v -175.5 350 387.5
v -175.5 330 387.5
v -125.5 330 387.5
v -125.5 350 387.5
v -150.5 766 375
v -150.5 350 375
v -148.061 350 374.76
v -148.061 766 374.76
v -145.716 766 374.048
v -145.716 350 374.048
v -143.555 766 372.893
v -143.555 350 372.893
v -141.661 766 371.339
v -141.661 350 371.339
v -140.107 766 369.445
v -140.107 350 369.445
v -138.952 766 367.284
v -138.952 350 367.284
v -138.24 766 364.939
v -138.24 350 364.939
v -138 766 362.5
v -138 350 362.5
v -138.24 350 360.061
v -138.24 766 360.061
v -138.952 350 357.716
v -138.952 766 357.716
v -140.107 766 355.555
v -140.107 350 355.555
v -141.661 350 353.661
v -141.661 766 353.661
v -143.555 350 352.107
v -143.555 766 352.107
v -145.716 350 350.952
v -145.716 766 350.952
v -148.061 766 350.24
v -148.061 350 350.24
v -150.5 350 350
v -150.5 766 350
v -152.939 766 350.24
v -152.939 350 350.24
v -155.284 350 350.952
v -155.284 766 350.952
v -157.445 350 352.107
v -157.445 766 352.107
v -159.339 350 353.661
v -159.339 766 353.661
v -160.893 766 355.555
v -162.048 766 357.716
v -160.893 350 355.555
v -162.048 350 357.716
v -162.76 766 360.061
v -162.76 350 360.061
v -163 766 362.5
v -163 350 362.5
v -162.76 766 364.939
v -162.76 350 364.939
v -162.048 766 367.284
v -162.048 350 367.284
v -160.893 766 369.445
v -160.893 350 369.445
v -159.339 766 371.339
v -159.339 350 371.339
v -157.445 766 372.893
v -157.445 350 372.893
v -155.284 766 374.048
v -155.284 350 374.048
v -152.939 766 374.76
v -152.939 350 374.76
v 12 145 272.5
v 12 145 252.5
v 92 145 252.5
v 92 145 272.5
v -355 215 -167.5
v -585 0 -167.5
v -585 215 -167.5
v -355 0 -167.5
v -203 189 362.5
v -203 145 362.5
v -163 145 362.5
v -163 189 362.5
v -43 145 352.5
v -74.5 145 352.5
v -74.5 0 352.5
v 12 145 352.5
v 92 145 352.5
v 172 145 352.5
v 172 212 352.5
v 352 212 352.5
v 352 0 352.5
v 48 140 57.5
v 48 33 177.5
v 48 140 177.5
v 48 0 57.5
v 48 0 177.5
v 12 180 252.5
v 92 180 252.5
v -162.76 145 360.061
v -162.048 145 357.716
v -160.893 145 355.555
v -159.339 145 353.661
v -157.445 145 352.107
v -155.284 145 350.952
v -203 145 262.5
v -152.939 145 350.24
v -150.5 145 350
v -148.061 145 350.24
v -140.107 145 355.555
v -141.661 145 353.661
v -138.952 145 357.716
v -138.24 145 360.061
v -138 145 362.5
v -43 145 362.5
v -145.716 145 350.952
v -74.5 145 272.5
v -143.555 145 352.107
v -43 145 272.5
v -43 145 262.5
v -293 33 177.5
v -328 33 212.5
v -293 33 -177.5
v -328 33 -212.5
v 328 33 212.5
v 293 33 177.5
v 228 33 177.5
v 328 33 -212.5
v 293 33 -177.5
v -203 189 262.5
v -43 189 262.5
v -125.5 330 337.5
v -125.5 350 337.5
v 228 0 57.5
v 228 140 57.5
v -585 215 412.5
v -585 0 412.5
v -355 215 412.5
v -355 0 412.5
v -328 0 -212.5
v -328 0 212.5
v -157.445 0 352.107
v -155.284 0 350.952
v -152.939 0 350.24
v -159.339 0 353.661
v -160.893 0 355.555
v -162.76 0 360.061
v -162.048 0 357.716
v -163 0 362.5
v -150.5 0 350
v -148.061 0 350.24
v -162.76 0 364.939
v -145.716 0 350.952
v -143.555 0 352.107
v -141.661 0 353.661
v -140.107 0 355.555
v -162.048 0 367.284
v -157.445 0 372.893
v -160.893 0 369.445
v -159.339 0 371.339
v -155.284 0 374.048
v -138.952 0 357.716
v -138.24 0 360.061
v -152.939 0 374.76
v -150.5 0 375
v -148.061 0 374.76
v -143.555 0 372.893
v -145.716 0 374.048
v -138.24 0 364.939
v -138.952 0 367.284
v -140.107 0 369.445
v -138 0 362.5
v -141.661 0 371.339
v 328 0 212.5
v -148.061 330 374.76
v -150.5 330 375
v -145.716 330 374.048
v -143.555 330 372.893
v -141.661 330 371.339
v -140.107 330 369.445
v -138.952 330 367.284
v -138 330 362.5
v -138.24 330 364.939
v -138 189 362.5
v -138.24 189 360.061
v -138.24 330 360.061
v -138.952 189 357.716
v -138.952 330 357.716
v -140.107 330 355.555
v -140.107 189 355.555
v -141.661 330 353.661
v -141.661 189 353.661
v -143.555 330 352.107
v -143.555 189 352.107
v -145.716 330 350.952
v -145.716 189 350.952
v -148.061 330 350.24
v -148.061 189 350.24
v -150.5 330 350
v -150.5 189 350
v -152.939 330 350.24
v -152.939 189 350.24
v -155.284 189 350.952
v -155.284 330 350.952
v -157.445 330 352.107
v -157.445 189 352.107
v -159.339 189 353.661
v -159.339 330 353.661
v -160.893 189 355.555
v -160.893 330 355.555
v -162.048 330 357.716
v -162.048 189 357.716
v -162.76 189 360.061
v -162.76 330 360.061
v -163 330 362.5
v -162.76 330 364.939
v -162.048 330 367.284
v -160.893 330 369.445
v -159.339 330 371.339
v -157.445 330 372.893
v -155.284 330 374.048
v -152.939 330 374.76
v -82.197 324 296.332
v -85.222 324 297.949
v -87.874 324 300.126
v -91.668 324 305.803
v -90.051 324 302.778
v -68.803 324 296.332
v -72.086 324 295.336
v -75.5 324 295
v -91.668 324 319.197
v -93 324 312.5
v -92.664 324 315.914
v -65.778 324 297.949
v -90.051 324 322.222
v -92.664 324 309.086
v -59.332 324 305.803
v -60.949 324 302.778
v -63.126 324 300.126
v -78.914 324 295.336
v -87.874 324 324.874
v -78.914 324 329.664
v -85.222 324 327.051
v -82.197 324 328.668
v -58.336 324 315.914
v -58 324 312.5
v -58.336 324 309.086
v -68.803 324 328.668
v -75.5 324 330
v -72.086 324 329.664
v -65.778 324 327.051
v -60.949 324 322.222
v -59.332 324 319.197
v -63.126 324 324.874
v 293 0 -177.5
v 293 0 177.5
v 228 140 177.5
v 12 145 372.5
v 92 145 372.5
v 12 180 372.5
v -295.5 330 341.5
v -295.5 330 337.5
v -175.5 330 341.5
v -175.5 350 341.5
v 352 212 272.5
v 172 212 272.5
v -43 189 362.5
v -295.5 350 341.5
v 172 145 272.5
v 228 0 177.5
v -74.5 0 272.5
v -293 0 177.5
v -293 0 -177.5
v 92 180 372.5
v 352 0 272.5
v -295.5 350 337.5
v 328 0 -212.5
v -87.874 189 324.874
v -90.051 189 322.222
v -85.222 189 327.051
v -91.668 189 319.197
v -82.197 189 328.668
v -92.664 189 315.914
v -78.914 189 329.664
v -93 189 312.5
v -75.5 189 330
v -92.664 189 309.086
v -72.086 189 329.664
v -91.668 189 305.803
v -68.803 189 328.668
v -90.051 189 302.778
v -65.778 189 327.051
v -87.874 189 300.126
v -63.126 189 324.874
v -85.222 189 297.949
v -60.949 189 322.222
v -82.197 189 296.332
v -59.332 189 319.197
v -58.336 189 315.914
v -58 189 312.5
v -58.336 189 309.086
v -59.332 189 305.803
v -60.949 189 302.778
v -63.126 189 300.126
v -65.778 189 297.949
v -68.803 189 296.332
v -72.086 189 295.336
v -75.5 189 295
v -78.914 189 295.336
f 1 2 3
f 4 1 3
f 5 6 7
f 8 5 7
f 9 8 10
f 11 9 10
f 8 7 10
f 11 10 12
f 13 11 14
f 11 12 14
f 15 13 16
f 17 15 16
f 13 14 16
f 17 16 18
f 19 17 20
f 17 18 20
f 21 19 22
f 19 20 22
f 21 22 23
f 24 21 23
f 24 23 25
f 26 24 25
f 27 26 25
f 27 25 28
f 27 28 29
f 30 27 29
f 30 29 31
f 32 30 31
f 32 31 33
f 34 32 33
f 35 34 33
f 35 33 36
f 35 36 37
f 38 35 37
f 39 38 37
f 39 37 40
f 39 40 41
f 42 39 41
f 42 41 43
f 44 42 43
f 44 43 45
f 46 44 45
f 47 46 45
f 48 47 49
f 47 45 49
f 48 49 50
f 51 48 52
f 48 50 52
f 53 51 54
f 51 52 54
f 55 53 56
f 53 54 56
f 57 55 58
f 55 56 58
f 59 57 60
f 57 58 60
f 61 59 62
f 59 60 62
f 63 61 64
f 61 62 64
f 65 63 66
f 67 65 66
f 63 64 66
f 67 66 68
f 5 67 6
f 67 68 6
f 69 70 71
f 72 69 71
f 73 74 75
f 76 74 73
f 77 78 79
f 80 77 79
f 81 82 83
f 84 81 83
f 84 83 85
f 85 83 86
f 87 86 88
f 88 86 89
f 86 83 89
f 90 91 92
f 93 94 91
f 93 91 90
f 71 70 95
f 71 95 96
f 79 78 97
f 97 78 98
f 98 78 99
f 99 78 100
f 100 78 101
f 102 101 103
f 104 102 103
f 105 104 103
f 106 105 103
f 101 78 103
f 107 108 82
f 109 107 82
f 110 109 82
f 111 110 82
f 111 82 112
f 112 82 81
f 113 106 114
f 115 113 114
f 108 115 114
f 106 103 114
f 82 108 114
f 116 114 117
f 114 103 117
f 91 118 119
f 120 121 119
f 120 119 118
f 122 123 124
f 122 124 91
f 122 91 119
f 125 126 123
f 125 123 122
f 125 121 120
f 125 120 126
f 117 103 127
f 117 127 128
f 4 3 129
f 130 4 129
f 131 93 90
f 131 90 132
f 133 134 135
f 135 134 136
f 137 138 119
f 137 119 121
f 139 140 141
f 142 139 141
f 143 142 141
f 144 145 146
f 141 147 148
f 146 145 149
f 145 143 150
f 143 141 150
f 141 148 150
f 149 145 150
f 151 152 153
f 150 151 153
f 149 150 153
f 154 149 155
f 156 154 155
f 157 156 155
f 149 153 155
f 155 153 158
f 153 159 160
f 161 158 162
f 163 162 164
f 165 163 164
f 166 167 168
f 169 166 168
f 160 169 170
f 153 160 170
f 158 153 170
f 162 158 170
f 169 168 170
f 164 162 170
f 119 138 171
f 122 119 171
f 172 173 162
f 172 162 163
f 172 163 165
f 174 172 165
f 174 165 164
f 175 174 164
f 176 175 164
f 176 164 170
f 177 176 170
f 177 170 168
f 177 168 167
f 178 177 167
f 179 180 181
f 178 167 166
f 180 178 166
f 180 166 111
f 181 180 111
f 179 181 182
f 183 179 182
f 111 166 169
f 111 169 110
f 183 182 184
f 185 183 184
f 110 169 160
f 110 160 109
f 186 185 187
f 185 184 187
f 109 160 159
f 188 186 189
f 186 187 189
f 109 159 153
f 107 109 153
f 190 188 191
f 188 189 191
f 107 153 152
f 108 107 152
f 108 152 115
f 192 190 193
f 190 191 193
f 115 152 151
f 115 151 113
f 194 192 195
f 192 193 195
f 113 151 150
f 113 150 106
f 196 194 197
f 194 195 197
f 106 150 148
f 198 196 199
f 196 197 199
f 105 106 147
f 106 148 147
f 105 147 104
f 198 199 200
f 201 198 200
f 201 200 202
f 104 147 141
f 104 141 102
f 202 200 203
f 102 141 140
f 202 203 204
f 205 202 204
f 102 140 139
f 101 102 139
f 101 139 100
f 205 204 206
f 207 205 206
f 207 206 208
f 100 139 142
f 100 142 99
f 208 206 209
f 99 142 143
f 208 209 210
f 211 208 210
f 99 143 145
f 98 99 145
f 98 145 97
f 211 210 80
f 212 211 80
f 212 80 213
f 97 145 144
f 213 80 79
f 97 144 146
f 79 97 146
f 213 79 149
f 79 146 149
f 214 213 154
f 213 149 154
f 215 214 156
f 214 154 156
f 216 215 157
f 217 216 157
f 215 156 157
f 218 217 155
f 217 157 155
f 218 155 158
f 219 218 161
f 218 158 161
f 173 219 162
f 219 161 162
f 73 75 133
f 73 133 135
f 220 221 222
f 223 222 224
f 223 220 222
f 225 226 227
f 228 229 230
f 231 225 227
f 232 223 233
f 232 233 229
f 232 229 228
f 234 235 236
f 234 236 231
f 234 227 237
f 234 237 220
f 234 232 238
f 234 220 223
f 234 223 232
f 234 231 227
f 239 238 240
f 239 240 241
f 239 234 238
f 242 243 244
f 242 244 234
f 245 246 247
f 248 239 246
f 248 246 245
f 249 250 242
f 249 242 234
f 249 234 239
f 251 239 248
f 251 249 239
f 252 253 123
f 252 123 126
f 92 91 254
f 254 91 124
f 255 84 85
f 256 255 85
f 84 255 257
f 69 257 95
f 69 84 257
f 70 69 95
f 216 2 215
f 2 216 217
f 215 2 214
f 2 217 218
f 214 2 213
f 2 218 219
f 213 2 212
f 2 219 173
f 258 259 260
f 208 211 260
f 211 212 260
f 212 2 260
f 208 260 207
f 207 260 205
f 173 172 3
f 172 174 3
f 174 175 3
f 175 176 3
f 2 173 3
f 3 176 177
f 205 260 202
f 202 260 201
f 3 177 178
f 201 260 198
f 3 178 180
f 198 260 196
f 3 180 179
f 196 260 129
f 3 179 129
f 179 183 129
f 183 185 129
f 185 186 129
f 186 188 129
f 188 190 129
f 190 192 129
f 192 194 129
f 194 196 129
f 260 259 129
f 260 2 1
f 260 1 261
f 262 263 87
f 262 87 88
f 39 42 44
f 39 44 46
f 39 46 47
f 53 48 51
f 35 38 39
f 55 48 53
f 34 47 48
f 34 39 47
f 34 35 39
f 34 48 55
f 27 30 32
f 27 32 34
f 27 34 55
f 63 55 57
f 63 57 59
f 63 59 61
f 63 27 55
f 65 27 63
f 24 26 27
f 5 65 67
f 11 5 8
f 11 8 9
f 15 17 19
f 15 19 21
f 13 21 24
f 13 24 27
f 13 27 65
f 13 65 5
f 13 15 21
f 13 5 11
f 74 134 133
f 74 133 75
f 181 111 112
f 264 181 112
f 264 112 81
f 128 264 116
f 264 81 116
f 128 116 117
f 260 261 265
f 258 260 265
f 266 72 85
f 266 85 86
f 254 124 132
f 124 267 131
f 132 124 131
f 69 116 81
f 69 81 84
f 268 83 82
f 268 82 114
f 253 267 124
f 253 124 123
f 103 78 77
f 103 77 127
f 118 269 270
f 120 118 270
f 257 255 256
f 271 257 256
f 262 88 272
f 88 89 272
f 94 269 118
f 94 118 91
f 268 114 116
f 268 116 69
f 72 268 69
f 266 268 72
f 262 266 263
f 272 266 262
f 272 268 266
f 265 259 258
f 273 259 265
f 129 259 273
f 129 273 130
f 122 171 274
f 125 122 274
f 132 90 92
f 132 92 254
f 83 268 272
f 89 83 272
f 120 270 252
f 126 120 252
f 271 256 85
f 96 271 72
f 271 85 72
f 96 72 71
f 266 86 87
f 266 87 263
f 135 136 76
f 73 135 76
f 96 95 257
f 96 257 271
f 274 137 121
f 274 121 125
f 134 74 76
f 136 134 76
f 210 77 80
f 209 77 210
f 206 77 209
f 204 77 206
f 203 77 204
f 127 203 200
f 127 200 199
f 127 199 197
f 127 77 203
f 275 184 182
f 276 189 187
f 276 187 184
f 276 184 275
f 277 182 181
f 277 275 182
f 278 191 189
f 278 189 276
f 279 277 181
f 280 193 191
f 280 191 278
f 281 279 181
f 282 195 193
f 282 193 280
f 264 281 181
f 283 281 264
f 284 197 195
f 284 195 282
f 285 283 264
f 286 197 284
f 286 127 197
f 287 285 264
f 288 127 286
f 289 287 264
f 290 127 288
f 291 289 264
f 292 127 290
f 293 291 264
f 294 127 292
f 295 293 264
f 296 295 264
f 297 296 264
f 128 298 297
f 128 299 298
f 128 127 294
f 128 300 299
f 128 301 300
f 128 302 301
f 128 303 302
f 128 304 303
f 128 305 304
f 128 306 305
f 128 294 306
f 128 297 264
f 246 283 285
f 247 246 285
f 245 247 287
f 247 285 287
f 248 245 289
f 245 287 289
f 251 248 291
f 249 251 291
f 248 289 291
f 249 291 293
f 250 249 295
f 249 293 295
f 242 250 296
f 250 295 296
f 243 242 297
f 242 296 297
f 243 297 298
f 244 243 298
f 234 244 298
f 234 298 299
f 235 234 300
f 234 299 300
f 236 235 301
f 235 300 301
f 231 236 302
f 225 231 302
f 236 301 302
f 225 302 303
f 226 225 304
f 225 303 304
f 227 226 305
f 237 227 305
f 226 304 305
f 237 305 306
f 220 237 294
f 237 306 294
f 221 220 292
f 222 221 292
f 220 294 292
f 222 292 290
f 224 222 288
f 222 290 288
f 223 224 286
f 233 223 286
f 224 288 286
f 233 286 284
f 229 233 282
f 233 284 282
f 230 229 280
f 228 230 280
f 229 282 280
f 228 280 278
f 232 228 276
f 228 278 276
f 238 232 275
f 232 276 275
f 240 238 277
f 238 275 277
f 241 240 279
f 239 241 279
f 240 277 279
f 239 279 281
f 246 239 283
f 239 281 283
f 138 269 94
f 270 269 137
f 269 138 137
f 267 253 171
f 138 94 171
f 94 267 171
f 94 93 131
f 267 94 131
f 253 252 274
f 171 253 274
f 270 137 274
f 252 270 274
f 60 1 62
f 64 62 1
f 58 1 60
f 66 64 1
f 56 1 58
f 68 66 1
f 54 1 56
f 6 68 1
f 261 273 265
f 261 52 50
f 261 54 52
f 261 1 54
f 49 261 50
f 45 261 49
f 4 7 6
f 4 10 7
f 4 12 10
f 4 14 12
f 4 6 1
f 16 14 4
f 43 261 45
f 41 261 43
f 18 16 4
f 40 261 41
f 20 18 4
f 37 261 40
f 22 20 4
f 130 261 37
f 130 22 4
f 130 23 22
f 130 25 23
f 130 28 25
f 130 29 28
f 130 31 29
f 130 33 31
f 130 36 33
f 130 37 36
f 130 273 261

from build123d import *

# Parameters (mm, degrees)
SKETCH1_W            = 656
SKETCH1_H            = 425
SKETCH1_W_2          = 586
SKETCH1_H_2          = 355
BOSS_EXTRUDE1_DEPTH  = 33
SKETCH2_W            = 180
SKETCH2_H            = 120
BOSS_EXTRUDE2_DEPTH  = 140
SKETCH4_W            = 426.5
SKETCH4_H            = 80
BOSS_EXTRUDE3_DEPTH  = 145
SKETCH5_W            = 180
SKETCH5_H            = 80
BOSS_EXTRUDE4_DEPTH  = 67
SKETCH6_W            = 80
SKETCH6_H            = 120
BOSS_EXTRUDE5_DEPTH  = 35
SKETCH7_W            = 160
SKETCH7_H            = 100
BOSS_EXTRUDE6_DEPTH  = 44
SKETCH8_R            = 17.5
BOSS_EXTRUDE7_DEPTH  = 135
SKETCH10_W           = 230
SKETCH10_H           = 580
BOSS_EXTRUDE8_DEPTH  = 215
SKETCH9_R            = 12.5
BOSS_EXTRUDE9_DEPTH  = 766
SKETCH11_W           = 50
SKETCH11_H           = 50
SKETCH11_R           = 12.5
BOSS_EXTRUDE10_DEPTH = 20
SKETCH12_W           = 170
SKETCH12_H           = 20
BOSS_EXTRUDE11_DEPTH = 4


with BuildPart() as part:
    # Sketch1 → Boss-Extrude1 (new body)
    with BuildSketch(Plane(origin=(0, 0, 0), x_dir=(1, 0, 0), z_dir=(0, 1, 0))):
        Rectangle(SKETCH1_W, SKETCH1_H)
        Rectangle(SKETCH1_W_2, SKETCH1_H_2, mode=Mode.SUBTRACT)
    extrude(amount=BOSS_EXTRUDE1_DEPTH)

    # Sketch2 → Boss-Extrude2 (add)
    with BuildSketch(Plane(origin=(0, 0, 0), x_dir=(1, 0, 0), z_dir=(0, 1, 0))):
        with Locations((138, -117.5)):
            Rectangle(SKETCH2_W, SKETCH2_H)
    extrude(amount=BOSS_EXTRUDE2_DEPTH)


with BuildPart() as body_2:
    # Sketch4 → Boss-Extrude3 (new body)
    with BuildSketch(Plane(origin=(0, 0, 0), x_dir=(1, 0, 0), z_dir=(0, 1, 0))):
        with Locations((138.75, -312.5)):
            Rectangle(SKETCH4_W, SKETCH4_H)
    extrude(amount=BOSS_EXTRUDE3_DEPTH)

    # Sketch5 → Boss-Extrude4 (add)
    with BuildSketch(Plane(origin=(0, 145, 0), x_dir=(1, 0, 0), z_dir=(0, 1, 0))):
        with Locations((262, -312.5)):
            Rectangle(SKETCH5_W, SKETCH5_H)
    extrude(amount=BOSS_EXTRUDE4_DEPTH)

    # Sketch6 → Boss-Extrude5 (add)
    with BuildSketch(Plane(origin=(0, 145, 0), x_dir=(1, 0, 0), z_dir=(0, 1, 0))):
        with Locations((52, -312.5)):
            Rectangle(SKETCH6_W, SKETCH6_H)
    extrude(amount=BOSS_EXTRUDE5_DEPTH)

    # Sketch7 → Boss-Extrude6 (add)
    with BuildSketch(Plane(origin=(0, 145, 0), x_dir=(1, 0, 0), z_dir=(0, 1, 0))):
        with Locations((-123, -312.5)):
            Rectangle(SKETCH7_W, SKETCH7_H)
    extrude(amount=BOSS_EXTRUDE6_DEPTH)

    # Sketch8 → Boss-Extrude7 (add)
    with BuildSketch(Plane(origin=(0, 189, 0), x_dir=(1, 0, 0), z_dir=(0, 1, 0))):
        with Locations((-75.5, -312.5)):
            Circle(SKETCH8_R)
    extrude(amount=BOSS_EXTRUDE7_DEPTH)

    # Sketch9 → Boss-Extrude9 (add)
    with BuildSketch(Plane(origin=(0, 0, 0), x_dir=(1, 0, 0), z_dir=(0, 1, 0))):
        with Locations((-150.5, -362.5)):
            Circle(SKETCH9_R)
    extrude(amount=BOSS_EXTRUDE9_DEPTH)

    # Sketch11 → Boss-Extrude10 (add)
    with BuildSketch(Plane(origin=(0, 330, 0), x_dir=(1, 0, 0), z_dir=(0, 1, 0))):
        with Locations((-150.5, -362.5)):
            Rectangle(SKETCH11_W, SKETCH11_H)
        with Locations((-150.5, -362.5)):
            Circle(SKETCH11_R, mode=Mode.SUBTRACT)
    extrude(amount=BOSS_EXTRUDE10_DEPTH)

    # Sketch12 → Boss-Extrude11 (add)
    with BuildSketch(Plane(origin=(0, 0, 337.5), x_dir=(-1, 0, 0), z_dir=(0, 0, -1))):
        with Locations((210.5, 340)):
            Rectangle(SKETCH12_W, SKETCH12_H)
    extrude(amount=-BOSS_EXTRUDE11_DEPTH)


with BuildPart() as body_3:
    # Sketch10 → Boss-Extrude8 (new body)
    with BuildSketch(Plane(origin=(0, 0, 0), x_dir=(1, 0, 0), z_dir=(0, 1, 0))):
        with Locations((-470, -122.5)):
            Rectangle(SKETCH10_W, SKETCH10_H)
    extrude(amount=BOSS_EXTRUDE8_DEPTH)


solid = Compound([part.part, body_2.part, body_3.part])
